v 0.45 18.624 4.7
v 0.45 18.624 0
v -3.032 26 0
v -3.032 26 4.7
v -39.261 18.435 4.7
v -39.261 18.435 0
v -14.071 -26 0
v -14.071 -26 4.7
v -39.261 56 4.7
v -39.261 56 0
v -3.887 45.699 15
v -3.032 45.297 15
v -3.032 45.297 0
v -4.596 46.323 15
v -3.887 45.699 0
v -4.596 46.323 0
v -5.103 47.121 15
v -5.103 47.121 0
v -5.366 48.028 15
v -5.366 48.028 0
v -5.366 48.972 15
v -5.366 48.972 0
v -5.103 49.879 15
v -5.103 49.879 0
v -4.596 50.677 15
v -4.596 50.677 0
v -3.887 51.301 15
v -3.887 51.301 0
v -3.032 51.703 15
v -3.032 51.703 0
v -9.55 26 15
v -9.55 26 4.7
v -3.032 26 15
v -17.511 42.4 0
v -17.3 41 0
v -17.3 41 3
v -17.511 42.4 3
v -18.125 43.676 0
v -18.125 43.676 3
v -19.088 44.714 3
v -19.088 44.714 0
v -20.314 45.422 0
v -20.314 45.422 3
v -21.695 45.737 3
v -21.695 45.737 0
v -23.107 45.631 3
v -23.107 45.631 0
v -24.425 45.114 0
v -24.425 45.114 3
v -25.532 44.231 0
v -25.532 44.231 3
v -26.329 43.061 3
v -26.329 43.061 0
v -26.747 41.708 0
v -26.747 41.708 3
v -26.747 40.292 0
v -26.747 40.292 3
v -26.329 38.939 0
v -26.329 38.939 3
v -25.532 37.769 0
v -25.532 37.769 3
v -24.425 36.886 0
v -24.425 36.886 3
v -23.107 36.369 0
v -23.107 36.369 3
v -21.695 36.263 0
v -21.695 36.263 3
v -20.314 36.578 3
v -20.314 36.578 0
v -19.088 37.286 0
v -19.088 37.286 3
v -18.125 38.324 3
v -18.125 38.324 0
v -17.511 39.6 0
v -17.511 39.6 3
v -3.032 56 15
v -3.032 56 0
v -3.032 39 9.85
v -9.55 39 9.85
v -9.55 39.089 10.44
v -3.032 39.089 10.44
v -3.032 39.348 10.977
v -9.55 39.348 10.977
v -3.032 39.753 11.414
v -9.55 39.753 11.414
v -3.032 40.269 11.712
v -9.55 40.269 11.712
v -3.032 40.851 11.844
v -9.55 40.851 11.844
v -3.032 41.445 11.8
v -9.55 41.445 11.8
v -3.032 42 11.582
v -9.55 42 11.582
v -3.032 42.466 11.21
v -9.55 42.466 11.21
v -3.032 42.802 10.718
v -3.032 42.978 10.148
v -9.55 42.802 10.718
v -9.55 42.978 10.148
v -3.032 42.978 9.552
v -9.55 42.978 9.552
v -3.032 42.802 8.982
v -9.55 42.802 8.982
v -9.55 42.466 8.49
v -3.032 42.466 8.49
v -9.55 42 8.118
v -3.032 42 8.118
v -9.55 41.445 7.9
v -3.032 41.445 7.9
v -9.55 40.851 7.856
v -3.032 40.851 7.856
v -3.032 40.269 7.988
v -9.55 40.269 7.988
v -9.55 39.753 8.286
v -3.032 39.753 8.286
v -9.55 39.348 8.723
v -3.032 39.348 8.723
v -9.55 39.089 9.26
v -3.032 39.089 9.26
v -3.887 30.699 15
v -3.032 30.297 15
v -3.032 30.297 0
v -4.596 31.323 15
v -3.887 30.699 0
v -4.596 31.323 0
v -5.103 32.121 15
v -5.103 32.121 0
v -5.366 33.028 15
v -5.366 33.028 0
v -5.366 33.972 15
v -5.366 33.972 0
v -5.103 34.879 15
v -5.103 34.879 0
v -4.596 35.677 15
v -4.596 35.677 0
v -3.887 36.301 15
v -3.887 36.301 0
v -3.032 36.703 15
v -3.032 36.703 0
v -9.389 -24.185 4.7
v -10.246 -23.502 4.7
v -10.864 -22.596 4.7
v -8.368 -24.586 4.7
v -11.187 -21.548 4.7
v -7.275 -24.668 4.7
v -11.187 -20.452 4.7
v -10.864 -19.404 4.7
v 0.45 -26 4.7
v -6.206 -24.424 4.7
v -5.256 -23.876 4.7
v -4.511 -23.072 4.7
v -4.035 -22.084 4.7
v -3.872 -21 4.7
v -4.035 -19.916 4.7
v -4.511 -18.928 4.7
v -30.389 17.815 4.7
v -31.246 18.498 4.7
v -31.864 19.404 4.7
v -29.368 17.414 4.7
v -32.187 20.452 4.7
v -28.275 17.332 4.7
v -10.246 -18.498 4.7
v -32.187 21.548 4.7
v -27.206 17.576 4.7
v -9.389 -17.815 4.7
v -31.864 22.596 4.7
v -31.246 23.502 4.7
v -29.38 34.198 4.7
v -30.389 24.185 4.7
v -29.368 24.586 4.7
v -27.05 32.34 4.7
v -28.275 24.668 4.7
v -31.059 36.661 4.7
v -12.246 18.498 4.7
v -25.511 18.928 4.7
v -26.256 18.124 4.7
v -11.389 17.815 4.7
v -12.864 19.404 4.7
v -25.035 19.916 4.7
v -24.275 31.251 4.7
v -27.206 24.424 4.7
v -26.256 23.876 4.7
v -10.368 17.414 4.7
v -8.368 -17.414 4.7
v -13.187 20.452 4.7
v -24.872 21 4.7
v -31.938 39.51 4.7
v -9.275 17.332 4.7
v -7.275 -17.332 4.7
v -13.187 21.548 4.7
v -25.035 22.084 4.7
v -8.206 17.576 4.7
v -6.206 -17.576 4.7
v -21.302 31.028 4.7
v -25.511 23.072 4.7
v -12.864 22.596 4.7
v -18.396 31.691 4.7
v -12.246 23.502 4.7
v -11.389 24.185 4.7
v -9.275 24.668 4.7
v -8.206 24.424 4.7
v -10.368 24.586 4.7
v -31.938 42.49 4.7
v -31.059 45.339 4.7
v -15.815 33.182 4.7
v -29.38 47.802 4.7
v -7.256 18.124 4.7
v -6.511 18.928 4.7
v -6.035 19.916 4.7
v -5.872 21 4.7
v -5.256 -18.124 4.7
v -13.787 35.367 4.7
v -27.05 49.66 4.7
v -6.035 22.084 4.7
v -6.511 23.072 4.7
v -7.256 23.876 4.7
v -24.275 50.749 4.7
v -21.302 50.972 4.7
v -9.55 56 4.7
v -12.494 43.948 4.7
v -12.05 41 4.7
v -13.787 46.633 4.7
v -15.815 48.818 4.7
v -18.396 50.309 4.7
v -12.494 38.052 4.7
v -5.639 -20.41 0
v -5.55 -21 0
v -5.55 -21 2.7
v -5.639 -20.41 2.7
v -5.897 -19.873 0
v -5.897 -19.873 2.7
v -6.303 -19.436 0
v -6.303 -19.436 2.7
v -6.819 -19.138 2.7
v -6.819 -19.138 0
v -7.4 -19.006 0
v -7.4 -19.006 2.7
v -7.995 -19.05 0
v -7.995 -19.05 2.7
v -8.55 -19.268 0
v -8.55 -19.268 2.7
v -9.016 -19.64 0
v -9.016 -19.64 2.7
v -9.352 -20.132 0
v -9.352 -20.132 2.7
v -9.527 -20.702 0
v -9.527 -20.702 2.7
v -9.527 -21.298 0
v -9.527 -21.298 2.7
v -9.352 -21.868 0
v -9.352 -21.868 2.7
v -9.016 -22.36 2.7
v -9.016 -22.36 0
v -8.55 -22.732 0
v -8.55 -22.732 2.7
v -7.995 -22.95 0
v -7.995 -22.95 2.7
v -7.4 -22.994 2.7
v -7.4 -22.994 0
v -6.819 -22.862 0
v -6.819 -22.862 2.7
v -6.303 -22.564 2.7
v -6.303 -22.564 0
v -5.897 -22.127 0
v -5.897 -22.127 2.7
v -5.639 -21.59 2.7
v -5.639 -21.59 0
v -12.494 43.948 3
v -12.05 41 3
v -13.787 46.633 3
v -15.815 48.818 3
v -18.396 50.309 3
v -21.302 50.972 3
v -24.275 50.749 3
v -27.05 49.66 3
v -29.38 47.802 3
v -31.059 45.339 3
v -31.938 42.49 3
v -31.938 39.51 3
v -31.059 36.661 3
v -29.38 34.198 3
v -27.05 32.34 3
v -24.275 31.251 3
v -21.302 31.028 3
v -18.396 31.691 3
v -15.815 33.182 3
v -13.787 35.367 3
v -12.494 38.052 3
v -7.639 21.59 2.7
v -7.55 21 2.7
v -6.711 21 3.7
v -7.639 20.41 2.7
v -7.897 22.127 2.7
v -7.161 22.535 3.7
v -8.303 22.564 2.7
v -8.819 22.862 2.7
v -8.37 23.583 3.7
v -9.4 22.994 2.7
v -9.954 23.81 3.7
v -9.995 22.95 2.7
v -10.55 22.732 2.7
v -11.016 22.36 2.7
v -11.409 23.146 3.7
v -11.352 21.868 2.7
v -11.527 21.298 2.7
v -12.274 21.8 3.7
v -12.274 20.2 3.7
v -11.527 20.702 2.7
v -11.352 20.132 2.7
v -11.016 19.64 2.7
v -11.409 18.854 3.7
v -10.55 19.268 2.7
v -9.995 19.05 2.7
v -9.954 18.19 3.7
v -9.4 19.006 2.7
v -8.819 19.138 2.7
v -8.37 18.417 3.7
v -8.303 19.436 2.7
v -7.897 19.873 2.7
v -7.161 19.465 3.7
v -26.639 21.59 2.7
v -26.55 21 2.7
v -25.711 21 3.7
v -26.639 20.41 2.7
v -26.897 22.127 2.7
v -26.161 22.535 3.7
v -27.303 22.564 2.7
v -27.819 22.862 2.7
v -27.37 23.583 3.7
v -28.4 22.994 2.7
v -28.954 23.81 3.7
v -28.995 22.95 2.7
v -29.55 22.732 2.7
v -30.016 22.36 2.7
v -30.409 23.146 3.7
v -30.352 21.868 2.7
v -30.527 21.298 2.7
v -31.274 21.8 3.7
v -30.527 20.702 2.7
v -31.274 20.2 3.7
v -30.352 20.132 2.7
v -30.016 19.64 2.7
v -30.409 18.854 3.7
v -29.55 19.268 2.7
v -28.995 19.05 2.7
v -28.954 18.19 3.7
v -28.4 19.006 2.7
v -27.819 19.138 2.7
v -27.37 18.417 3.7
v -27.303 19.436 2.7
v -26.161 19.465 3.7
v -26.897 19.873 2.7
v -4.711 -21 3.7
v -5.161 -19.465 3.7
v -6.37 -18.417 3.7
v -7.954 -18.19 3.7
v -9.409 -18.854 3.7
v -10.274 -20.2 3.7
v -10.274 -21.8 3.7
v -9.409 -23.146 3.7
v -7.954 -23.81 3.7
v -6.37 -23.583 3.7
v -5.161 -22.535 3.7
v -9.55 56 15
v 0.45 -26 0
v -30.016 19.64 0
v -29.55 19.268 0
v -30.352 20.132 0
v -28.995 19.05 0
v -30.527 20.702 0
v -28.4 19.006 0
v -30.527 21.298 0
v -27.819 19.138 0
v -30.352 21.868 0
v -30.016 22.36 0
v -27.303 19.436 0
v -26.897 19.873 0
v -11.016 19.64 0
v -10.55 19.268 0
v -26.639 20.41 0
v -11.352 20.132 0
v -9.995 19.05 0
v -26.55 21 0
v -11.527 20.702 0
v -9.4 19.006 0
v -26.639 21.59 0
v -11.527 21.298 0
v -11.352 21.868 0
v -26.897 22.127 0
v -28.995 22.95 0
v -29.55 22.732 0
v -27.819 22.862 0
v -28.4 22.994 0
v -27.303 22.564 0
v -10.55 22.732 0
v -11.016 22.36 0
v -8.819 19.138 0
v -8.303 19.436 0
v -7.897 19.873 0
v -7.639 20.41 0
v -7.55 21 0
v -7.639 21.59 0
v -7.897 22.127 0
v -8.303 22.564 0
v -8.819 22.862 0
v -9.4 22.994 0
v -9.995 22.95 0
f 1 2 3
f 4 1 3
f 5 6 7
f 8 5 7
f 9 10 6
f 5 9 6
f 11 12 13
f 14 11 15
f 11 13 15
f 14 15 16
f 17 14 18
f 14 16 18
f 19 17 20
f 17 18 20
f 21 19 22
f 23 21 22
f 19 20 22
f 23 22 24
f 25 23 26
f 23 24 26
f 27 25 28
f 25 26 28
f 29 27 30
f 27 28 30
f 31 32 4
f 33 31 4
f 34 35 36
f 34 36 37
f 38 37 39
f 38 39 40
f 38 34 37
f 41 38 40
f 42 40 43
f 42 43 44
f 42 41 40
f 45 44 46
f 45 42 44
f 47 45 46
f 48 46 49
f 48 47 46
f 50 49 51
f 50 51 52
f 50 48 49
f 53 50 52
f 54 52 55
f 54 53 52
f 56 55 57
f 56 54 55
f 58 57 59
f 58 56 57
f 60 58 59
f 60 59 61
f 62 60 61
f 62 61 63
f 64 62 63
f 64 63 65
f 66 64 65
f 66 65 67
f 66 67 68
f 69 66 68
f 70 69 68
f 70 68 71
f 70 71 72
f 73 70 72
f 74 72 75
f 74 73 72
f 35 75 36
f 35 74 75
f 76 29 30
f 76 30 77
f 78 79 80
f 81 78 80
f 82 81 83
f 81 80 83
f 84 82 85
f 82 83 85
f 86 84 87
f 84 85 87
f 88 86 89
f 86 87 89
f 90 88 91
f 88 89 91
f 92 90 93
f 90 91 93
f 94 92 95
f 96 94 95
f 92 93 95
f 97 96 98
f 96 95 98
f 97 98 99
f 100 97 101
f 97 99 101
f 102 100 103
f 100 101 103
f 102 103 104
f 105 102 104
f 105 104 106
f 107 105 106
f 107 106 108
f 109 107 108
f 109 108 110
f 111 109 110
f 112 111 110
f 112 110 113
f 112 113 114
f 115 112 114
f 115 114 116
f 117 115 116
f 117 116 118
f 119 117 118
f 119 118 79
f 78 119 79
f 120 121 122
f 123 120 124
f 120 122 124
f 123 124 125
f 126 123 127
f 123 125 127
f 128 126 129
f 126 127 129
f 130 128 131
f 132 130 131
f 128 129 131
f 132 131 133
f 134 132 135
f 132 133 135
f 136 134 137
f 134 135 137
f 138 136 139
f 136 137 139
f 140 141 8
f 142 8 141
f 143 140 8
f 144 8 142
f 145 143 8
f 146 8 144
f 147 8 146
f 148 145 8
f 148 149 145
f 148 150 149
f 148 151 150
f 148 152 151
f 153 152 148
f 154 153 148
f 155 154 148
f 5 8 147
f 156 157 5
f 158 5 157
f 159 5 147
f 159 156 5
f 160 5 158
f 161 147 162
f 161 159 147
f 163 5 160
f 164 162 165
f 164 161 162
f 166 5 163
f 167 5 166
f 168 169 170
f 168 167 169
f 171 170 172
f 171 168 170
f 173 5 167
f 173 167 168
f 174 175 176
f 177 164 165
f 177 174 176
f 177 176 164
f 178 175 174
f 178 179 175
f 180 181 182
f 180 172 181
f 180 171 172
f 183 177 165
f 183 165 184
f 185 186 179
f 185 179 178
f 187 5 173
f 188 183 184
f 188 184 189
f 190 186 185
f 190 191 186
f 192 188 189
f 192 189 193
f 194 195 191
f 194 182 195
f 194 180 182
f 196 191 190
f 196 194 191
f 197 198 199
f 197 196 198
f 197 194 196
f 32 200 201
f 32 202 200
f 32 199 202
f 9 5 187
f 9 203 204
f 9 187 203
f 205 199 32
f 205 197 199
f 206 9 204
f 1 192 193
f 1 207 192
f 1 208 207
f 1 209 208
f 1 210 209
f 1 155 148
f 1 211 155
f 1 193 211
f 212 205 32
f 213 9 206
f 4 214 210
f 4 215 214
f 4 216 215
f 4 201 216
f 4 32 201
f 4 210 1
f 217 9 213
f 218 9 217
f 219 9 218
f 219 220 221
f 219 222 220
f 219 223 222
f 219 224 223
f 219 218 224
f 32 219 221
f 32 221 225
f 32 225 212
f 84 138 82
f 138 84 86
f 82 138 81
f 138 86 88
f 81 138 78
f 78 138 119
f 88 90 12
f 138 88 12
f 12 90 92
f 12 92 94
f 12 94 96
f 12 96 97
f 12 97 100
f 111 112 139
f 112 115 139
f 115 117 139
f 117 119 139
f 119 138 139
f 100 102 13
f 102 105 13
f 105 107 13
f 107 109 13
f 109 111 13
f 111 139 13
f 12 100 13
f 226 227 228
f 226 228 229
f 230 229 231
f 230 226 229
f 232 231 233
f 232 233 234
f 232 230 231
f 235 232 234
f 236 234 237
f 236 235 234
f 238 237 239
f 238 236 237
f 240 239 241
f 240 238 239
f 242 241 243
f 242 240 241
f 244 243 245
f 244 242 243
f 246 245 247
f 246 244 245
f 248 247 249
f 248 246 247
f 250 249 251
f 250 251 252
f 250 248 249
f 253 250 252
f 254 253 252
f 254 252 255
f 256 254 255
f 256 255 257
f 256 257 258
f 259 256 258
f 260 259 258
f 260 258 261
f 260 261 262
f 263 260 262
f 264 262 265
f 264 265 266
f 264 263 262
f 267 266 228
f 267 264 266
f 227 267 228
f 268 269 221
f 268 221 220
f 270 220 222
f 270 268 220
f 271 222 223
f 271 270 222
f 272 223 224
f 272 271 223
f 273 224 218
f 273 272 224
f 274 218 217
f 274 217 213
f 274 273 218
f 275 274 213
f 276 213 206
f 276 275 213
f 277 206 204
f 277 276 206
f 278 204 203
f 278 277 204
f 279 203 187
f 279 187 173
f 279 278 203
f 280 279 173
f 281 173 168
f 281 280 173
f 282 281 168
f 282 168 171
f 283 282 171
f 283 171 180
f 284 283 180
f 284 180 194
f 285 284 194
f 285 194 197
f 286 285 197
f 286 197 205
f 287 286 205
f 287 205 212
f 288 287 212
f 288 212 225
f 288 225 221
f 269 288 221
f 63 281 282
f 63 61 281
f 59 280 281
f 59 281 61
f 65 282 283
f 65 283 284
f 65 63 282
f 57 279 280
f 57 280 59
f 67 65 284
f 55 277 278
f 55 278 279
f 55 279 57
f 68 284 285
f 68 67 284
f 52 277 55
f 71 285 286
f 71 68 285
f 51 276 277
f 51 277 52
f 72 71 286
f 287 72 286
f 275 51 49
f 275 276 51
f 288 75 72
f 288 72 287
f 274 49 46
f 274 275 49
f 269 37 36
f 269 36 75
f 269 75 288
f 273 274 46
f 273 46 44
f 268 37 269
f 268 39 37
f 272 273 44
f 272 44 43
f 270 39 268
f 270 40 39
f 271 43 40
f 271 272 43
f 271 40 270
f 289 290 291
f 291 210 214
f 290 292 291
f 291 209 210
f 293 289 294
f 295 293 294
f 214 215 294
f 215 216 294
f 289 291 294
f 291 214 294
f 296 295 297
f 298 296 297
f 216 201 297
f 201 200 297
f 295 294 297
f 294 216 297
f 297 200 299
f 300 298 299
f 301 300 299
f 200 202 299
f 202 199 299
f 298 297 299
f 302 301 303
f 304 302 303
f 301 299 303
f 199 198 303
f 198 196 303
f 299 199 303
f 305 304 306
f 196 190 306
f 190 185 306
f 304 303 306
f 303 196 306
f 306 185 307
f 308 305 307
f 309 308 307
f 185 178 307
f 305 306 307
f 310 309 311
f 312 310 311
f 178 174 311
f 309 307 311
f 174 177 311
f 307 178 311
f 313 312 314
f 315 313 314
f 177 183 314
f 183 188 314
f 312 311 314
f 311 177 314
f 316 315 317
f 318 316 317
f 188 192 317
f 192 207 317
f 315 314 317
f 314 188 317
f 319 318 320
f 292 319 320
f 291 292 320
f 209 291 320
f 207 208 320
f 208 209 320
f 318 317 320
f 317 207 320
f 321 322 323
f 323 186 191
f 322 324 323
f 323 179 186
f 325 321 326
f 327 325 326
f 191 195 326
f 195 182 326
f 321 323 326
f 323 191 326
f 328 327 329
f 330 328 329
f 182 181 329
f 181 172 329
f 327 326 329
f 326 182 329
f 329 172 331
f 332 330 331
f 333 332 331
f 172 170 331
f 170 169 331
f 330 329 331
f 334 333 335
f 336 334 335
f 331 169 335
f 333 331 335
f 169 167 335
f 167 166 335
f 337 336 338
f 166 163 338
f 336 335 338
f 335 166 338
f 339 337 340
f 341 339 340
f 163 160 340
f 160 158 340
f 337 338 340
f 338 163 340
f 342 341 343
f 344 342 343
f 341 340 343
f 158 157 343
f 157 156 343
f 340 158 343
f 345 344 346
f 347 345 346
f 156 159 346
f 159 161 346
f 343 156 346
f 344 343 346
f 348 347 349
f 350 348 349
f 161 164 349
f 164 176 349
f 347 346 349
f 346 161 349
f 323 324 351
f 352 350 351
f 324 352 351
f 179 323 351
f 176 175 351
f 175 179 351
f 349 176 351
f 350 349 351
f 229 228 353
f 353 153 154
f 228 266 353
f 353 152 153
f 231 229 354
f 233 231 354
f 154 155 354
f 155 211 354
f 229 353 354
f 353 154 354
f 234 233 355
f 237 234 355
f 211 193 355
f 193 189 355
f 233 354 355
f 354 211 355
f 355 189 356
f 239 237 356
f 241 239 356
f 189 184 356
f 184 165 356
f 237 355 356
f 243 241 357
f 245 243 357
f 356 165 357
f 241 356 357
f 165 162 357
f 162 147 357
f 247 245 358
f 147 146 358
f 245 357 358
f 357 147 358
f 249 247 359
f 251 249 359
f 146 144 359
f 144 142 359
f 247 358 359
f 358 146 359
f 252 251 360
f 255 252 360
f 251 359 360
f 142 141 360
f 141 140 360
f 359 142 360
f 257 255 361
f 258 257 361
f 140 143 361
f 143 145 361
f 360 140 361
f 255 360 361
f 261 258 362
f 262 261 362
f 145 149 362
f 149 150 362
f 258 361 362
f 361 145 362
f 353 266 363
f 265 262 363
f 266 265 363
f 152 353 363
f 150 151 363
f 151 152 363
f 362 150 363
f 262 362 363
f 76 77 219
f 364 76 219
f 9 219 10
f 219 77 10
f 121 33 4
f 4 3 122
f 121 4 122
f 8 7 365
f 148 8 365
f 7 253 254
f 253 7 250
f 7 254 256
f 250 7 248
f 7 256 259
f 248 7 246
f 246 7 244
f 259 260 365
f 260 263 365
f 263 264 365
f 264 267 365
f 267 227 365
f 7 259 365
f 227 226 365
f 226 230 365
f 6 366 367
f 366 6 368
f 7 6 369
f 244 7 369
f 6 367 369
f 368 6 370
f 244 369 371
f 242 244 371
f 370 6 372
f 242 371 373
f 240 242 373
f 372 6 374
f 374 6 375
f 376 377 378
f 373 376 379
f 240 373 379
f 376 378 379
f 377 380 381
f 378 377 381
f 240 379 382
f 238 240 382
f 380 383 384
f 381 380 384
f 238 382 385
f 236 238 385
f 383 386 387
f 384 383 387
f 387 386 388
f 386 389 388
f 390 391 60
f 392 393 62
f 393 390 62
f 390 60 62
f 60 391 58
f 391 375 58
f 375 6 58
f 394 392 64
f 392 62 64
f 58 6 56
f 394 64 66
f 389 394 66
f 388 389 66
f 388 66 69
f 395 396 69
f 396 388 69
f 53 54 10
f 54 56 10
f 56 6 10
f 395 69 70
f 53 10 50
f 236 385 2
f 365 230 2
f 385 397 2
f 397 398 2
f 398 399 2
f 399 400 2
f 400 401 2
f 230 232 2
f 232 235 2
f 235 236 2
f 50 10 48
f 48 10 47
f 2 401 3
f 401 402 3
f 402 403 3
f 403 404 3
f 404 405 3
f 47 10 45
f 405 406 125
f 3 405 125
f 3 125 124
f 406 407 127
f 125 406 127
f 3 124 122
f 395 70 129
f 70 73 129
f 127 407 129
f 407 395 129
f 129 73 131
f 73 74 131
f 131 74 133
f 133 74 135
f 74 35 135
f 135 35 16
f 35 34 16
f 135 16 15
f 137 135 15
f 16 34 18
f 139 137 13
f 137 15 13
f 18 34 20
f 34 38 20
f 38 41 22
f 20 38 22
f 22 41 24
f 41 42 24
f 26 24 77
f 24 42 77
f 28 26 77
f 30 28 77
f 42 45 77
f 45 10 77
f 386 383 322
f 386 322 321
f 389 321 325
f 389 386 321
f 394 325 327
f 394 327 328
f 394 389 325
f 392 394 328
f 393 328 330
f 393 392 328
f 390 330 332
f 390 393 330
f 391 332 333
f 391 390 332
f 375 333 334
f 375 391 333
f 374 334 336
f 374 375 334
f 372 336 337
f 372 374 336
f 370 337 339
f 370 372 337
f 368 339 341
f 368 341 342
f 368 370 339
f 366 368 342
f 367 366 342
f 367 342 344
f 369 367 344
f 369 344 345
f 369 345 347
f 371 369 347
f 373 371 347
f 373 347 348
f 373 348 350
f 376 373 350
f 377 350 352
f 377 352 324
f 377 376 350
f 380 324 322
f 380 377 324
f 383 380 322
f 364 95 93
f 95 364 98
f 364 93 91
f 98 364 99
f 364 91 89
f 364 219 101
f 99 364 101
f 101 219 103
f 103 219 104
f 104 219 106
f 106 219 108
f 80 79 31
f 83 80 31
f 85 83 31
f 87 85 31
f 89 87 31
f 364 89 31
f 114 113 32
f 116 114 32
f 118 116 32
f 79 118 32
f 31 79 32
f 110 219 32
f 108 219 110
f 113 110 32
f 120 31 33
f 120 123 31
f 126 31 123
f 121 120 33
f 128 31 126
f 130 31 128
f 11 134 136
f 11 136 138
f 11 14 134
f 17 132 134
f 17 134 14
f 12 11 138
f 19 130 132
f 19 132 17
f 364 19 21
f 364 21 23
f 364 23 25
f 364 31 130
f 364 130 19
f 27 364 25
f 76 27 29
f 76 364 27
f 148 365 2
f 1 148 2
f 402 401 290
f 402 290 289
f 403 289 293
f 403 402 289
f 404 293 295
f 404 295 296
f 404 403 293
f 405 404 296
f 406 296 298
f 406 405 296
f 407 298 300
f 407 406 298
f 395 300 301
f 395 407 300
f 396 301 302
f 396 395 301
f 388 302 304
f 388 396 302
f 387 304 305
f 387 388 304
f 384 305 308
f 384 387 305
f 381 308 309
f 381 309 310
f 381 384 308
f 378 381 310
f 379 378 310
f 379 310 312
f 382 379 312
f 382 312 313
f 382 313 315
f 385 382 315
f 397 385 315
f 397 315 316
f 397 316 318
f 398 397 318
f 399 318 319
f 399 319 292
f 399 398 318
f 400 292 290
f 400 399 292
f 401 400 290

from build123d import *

# Parameters (mm, degrees)
F0_R       = 3.5
F0_R_2     = 10
F0_R_3     = 2
F1_DEPTH   = 4.7
F2_SIZE2   = 1.6781992624
F2_SIZE    = 2
F2_2_SIZE2 = 1.6781992624
F2_2_SIZE  = 2
F2_3_SIZE2 = 1.6781992624
F2_3_SIZE  = 2
F3_DEPTH   = 15
F0_R_4     = 4.75
F4_DEPTH   = 3
F5_R       = 2
F6_DEPTH   = 8


# Not quite as in the source:
# - a feature names something its author has since deleted; it is built from what else it names


with BuildPart() as f1:
    # F0 (on Top) → F1 (new body)
    with BuildSketch(Plane.XY):
        Polygon((-39.2612926662, 18.4351751247), (-14.0709569678, -26), (0.450202167, -26), (0.450202167, 18.6235290021), (-3.0323355459, 26), (-9.549797833, 26), (-9.549797833, 56), (-39.2612926662, 56), align=None)
        with Locations((-7.549797833, -21)):
            Circle(F0_R, mode=Mode.SUBTRACT)
        with Locations((-28.549797833, 21)):
            Circle(F0_R, mode=Mode.SUBTRACT)
        with Locations((-22.049797833, 41)):
            Circle(F0_R_2, mode=Mode.SUBTRACT)
        with Locations((-9.549797833, 21)):
            Circle(F0_R, mode=Mode.SUBTRACT)
        with BuildLine():
            Line((-9.549797833, 26), (-3.0323355459, 26))
            Line((-3.0323355459, 26), (-3.0323355459, 30.2973261729))
            ThreePointArc((-3.0323355459, 30.2973261729), (-5.399797833, 33.5), (-3.0323355459, 36.7026738271))
            Line((-3.0323355459, 36.7026738271), (-3.0323355459, 45.2973261729))
            ThreePointArc((-3.0323355459, 45.2973261729), (-5.399797833, 48.5), (-3.0323355459, 51.7026738271))
            Line((-3.0323355459, 51.7026738271), (-3.0323355459, 56))
            Line((-3.0323355459, 56), (-9.549797833, 56))
            Line((-9.549797833, 56), (-9.549797833, 26))
        make_face()
        with Locations((-28.549797833, 21)):
            Circle(F0_R)
        with Locations((-28.549797833, 21)):
            Circle(F0_R_3, mode=Mode.SUBTRACT)
        with Locations((-9.549797833, 21)):
            Circle(F0_R)
        with Locations((-9.549797833, 21)):
            Circle(F0_R_3, mode=Mode.SUBTRACT)
        with Locations((-7.549797833, -21)):
            Circle(F0_R)
        with Locations((-7.549797833, -21)):
            Circle(F0_R_3, mode=Mode.SUBTRACT)
    extrude(amount=F1_DEPTH)

    # F2
    f2_edges = [f1.edges().sort_by_distance(p)[0] for p in [
        (-30.549798, 21, 4.7),
    ]]
    f2_side = f1.faces().sort_by_distance((-30.549798, 21, 2.35))[0]
    chamfer(f2_edges, length=F2_SIZE, length2=F2_SIZE2, reference=f2_side)

    # F2#2
    f2_2_edges = [f1.edges().sort_by_distance(p)[0] for p in [
        (-11.549798, 21, 4.7),
    ]]
    f2_2_side = f1.faces().sort_by_distance((-11.549798, 21, 2.35))[0]
    chamfer(f2_2_edges, length=F2_2_SIZE, length2=F2_2_SIZE2, reference=f2_2_side)

    # F2#3
    f2_3_edges = [f1.edges().sort_by_distance(p)[0] for p in [
        (-9.549798, -21, 4.7),
    ]]
    f2_3_side = f1.faces().sort_by_distance((-9.549798, -21, 2.35))[0]
    chamfer(f2_3_edges, length=F2_3_SIZE, length2=F2_3_SIZE2, reference=f2_3_side)

    # F0 (on Top) → F3 (join)
    with BuildSketch(Plane.XY):
        with BuildLine():
            Line((-9.549797833, 26), (-3.0323355459, 26))
            Line((-3.0323355459, 26), (-3.0323355459, 30.2973261729))
            ThreePointArc((-3.0323355459, 30.2973261729), (-5.399797833, 33.5), (-3.0323355459, 36.7026738271))
            Line((-3.0323355459, 36.7026738271), (-3.0323355459, 45.2973261729))
            ThreePointArc((-3.0323355459, 45.2973261729), (-5.399797833, 48.5), (-3.0323355459, 51.7026738271))
            Line((-3.0323355459, 51.7026738271), (-3.0323355459, 56))
            Line((-3.0323355459, 56), (-9.549797833, 56))
            Line((-9.549797833, 56), (-9.549797833, 26))
        make_face()
    extrude(amount=F3_DEPTH)

    # F0 (on Top) → F4 (join)
    with BuildSketch(Plane.XY):
        with Locations((-22.049797833, 41)):
            Circle(F0_R_2)
        with Locations((-22.049797833, 41)):
            Circle(F0_R_4, mode=Mode.SUBTRACT)
    extrude(amount=F4_DEPTH)

    # F5 (on face) → F6 (cut)
    with BuildSketch(Plane(origin=(-9.549797833, 0, 0), x_dir=(0, -1, 0), z_dir=(-1, 0, 0))):
        with Locations((-41, 9.85)):
            Circle(F5_R)
    extrude(amount=-F6_DEPTH, mode=Mode.SUBTRACT)


solid = f1.part
